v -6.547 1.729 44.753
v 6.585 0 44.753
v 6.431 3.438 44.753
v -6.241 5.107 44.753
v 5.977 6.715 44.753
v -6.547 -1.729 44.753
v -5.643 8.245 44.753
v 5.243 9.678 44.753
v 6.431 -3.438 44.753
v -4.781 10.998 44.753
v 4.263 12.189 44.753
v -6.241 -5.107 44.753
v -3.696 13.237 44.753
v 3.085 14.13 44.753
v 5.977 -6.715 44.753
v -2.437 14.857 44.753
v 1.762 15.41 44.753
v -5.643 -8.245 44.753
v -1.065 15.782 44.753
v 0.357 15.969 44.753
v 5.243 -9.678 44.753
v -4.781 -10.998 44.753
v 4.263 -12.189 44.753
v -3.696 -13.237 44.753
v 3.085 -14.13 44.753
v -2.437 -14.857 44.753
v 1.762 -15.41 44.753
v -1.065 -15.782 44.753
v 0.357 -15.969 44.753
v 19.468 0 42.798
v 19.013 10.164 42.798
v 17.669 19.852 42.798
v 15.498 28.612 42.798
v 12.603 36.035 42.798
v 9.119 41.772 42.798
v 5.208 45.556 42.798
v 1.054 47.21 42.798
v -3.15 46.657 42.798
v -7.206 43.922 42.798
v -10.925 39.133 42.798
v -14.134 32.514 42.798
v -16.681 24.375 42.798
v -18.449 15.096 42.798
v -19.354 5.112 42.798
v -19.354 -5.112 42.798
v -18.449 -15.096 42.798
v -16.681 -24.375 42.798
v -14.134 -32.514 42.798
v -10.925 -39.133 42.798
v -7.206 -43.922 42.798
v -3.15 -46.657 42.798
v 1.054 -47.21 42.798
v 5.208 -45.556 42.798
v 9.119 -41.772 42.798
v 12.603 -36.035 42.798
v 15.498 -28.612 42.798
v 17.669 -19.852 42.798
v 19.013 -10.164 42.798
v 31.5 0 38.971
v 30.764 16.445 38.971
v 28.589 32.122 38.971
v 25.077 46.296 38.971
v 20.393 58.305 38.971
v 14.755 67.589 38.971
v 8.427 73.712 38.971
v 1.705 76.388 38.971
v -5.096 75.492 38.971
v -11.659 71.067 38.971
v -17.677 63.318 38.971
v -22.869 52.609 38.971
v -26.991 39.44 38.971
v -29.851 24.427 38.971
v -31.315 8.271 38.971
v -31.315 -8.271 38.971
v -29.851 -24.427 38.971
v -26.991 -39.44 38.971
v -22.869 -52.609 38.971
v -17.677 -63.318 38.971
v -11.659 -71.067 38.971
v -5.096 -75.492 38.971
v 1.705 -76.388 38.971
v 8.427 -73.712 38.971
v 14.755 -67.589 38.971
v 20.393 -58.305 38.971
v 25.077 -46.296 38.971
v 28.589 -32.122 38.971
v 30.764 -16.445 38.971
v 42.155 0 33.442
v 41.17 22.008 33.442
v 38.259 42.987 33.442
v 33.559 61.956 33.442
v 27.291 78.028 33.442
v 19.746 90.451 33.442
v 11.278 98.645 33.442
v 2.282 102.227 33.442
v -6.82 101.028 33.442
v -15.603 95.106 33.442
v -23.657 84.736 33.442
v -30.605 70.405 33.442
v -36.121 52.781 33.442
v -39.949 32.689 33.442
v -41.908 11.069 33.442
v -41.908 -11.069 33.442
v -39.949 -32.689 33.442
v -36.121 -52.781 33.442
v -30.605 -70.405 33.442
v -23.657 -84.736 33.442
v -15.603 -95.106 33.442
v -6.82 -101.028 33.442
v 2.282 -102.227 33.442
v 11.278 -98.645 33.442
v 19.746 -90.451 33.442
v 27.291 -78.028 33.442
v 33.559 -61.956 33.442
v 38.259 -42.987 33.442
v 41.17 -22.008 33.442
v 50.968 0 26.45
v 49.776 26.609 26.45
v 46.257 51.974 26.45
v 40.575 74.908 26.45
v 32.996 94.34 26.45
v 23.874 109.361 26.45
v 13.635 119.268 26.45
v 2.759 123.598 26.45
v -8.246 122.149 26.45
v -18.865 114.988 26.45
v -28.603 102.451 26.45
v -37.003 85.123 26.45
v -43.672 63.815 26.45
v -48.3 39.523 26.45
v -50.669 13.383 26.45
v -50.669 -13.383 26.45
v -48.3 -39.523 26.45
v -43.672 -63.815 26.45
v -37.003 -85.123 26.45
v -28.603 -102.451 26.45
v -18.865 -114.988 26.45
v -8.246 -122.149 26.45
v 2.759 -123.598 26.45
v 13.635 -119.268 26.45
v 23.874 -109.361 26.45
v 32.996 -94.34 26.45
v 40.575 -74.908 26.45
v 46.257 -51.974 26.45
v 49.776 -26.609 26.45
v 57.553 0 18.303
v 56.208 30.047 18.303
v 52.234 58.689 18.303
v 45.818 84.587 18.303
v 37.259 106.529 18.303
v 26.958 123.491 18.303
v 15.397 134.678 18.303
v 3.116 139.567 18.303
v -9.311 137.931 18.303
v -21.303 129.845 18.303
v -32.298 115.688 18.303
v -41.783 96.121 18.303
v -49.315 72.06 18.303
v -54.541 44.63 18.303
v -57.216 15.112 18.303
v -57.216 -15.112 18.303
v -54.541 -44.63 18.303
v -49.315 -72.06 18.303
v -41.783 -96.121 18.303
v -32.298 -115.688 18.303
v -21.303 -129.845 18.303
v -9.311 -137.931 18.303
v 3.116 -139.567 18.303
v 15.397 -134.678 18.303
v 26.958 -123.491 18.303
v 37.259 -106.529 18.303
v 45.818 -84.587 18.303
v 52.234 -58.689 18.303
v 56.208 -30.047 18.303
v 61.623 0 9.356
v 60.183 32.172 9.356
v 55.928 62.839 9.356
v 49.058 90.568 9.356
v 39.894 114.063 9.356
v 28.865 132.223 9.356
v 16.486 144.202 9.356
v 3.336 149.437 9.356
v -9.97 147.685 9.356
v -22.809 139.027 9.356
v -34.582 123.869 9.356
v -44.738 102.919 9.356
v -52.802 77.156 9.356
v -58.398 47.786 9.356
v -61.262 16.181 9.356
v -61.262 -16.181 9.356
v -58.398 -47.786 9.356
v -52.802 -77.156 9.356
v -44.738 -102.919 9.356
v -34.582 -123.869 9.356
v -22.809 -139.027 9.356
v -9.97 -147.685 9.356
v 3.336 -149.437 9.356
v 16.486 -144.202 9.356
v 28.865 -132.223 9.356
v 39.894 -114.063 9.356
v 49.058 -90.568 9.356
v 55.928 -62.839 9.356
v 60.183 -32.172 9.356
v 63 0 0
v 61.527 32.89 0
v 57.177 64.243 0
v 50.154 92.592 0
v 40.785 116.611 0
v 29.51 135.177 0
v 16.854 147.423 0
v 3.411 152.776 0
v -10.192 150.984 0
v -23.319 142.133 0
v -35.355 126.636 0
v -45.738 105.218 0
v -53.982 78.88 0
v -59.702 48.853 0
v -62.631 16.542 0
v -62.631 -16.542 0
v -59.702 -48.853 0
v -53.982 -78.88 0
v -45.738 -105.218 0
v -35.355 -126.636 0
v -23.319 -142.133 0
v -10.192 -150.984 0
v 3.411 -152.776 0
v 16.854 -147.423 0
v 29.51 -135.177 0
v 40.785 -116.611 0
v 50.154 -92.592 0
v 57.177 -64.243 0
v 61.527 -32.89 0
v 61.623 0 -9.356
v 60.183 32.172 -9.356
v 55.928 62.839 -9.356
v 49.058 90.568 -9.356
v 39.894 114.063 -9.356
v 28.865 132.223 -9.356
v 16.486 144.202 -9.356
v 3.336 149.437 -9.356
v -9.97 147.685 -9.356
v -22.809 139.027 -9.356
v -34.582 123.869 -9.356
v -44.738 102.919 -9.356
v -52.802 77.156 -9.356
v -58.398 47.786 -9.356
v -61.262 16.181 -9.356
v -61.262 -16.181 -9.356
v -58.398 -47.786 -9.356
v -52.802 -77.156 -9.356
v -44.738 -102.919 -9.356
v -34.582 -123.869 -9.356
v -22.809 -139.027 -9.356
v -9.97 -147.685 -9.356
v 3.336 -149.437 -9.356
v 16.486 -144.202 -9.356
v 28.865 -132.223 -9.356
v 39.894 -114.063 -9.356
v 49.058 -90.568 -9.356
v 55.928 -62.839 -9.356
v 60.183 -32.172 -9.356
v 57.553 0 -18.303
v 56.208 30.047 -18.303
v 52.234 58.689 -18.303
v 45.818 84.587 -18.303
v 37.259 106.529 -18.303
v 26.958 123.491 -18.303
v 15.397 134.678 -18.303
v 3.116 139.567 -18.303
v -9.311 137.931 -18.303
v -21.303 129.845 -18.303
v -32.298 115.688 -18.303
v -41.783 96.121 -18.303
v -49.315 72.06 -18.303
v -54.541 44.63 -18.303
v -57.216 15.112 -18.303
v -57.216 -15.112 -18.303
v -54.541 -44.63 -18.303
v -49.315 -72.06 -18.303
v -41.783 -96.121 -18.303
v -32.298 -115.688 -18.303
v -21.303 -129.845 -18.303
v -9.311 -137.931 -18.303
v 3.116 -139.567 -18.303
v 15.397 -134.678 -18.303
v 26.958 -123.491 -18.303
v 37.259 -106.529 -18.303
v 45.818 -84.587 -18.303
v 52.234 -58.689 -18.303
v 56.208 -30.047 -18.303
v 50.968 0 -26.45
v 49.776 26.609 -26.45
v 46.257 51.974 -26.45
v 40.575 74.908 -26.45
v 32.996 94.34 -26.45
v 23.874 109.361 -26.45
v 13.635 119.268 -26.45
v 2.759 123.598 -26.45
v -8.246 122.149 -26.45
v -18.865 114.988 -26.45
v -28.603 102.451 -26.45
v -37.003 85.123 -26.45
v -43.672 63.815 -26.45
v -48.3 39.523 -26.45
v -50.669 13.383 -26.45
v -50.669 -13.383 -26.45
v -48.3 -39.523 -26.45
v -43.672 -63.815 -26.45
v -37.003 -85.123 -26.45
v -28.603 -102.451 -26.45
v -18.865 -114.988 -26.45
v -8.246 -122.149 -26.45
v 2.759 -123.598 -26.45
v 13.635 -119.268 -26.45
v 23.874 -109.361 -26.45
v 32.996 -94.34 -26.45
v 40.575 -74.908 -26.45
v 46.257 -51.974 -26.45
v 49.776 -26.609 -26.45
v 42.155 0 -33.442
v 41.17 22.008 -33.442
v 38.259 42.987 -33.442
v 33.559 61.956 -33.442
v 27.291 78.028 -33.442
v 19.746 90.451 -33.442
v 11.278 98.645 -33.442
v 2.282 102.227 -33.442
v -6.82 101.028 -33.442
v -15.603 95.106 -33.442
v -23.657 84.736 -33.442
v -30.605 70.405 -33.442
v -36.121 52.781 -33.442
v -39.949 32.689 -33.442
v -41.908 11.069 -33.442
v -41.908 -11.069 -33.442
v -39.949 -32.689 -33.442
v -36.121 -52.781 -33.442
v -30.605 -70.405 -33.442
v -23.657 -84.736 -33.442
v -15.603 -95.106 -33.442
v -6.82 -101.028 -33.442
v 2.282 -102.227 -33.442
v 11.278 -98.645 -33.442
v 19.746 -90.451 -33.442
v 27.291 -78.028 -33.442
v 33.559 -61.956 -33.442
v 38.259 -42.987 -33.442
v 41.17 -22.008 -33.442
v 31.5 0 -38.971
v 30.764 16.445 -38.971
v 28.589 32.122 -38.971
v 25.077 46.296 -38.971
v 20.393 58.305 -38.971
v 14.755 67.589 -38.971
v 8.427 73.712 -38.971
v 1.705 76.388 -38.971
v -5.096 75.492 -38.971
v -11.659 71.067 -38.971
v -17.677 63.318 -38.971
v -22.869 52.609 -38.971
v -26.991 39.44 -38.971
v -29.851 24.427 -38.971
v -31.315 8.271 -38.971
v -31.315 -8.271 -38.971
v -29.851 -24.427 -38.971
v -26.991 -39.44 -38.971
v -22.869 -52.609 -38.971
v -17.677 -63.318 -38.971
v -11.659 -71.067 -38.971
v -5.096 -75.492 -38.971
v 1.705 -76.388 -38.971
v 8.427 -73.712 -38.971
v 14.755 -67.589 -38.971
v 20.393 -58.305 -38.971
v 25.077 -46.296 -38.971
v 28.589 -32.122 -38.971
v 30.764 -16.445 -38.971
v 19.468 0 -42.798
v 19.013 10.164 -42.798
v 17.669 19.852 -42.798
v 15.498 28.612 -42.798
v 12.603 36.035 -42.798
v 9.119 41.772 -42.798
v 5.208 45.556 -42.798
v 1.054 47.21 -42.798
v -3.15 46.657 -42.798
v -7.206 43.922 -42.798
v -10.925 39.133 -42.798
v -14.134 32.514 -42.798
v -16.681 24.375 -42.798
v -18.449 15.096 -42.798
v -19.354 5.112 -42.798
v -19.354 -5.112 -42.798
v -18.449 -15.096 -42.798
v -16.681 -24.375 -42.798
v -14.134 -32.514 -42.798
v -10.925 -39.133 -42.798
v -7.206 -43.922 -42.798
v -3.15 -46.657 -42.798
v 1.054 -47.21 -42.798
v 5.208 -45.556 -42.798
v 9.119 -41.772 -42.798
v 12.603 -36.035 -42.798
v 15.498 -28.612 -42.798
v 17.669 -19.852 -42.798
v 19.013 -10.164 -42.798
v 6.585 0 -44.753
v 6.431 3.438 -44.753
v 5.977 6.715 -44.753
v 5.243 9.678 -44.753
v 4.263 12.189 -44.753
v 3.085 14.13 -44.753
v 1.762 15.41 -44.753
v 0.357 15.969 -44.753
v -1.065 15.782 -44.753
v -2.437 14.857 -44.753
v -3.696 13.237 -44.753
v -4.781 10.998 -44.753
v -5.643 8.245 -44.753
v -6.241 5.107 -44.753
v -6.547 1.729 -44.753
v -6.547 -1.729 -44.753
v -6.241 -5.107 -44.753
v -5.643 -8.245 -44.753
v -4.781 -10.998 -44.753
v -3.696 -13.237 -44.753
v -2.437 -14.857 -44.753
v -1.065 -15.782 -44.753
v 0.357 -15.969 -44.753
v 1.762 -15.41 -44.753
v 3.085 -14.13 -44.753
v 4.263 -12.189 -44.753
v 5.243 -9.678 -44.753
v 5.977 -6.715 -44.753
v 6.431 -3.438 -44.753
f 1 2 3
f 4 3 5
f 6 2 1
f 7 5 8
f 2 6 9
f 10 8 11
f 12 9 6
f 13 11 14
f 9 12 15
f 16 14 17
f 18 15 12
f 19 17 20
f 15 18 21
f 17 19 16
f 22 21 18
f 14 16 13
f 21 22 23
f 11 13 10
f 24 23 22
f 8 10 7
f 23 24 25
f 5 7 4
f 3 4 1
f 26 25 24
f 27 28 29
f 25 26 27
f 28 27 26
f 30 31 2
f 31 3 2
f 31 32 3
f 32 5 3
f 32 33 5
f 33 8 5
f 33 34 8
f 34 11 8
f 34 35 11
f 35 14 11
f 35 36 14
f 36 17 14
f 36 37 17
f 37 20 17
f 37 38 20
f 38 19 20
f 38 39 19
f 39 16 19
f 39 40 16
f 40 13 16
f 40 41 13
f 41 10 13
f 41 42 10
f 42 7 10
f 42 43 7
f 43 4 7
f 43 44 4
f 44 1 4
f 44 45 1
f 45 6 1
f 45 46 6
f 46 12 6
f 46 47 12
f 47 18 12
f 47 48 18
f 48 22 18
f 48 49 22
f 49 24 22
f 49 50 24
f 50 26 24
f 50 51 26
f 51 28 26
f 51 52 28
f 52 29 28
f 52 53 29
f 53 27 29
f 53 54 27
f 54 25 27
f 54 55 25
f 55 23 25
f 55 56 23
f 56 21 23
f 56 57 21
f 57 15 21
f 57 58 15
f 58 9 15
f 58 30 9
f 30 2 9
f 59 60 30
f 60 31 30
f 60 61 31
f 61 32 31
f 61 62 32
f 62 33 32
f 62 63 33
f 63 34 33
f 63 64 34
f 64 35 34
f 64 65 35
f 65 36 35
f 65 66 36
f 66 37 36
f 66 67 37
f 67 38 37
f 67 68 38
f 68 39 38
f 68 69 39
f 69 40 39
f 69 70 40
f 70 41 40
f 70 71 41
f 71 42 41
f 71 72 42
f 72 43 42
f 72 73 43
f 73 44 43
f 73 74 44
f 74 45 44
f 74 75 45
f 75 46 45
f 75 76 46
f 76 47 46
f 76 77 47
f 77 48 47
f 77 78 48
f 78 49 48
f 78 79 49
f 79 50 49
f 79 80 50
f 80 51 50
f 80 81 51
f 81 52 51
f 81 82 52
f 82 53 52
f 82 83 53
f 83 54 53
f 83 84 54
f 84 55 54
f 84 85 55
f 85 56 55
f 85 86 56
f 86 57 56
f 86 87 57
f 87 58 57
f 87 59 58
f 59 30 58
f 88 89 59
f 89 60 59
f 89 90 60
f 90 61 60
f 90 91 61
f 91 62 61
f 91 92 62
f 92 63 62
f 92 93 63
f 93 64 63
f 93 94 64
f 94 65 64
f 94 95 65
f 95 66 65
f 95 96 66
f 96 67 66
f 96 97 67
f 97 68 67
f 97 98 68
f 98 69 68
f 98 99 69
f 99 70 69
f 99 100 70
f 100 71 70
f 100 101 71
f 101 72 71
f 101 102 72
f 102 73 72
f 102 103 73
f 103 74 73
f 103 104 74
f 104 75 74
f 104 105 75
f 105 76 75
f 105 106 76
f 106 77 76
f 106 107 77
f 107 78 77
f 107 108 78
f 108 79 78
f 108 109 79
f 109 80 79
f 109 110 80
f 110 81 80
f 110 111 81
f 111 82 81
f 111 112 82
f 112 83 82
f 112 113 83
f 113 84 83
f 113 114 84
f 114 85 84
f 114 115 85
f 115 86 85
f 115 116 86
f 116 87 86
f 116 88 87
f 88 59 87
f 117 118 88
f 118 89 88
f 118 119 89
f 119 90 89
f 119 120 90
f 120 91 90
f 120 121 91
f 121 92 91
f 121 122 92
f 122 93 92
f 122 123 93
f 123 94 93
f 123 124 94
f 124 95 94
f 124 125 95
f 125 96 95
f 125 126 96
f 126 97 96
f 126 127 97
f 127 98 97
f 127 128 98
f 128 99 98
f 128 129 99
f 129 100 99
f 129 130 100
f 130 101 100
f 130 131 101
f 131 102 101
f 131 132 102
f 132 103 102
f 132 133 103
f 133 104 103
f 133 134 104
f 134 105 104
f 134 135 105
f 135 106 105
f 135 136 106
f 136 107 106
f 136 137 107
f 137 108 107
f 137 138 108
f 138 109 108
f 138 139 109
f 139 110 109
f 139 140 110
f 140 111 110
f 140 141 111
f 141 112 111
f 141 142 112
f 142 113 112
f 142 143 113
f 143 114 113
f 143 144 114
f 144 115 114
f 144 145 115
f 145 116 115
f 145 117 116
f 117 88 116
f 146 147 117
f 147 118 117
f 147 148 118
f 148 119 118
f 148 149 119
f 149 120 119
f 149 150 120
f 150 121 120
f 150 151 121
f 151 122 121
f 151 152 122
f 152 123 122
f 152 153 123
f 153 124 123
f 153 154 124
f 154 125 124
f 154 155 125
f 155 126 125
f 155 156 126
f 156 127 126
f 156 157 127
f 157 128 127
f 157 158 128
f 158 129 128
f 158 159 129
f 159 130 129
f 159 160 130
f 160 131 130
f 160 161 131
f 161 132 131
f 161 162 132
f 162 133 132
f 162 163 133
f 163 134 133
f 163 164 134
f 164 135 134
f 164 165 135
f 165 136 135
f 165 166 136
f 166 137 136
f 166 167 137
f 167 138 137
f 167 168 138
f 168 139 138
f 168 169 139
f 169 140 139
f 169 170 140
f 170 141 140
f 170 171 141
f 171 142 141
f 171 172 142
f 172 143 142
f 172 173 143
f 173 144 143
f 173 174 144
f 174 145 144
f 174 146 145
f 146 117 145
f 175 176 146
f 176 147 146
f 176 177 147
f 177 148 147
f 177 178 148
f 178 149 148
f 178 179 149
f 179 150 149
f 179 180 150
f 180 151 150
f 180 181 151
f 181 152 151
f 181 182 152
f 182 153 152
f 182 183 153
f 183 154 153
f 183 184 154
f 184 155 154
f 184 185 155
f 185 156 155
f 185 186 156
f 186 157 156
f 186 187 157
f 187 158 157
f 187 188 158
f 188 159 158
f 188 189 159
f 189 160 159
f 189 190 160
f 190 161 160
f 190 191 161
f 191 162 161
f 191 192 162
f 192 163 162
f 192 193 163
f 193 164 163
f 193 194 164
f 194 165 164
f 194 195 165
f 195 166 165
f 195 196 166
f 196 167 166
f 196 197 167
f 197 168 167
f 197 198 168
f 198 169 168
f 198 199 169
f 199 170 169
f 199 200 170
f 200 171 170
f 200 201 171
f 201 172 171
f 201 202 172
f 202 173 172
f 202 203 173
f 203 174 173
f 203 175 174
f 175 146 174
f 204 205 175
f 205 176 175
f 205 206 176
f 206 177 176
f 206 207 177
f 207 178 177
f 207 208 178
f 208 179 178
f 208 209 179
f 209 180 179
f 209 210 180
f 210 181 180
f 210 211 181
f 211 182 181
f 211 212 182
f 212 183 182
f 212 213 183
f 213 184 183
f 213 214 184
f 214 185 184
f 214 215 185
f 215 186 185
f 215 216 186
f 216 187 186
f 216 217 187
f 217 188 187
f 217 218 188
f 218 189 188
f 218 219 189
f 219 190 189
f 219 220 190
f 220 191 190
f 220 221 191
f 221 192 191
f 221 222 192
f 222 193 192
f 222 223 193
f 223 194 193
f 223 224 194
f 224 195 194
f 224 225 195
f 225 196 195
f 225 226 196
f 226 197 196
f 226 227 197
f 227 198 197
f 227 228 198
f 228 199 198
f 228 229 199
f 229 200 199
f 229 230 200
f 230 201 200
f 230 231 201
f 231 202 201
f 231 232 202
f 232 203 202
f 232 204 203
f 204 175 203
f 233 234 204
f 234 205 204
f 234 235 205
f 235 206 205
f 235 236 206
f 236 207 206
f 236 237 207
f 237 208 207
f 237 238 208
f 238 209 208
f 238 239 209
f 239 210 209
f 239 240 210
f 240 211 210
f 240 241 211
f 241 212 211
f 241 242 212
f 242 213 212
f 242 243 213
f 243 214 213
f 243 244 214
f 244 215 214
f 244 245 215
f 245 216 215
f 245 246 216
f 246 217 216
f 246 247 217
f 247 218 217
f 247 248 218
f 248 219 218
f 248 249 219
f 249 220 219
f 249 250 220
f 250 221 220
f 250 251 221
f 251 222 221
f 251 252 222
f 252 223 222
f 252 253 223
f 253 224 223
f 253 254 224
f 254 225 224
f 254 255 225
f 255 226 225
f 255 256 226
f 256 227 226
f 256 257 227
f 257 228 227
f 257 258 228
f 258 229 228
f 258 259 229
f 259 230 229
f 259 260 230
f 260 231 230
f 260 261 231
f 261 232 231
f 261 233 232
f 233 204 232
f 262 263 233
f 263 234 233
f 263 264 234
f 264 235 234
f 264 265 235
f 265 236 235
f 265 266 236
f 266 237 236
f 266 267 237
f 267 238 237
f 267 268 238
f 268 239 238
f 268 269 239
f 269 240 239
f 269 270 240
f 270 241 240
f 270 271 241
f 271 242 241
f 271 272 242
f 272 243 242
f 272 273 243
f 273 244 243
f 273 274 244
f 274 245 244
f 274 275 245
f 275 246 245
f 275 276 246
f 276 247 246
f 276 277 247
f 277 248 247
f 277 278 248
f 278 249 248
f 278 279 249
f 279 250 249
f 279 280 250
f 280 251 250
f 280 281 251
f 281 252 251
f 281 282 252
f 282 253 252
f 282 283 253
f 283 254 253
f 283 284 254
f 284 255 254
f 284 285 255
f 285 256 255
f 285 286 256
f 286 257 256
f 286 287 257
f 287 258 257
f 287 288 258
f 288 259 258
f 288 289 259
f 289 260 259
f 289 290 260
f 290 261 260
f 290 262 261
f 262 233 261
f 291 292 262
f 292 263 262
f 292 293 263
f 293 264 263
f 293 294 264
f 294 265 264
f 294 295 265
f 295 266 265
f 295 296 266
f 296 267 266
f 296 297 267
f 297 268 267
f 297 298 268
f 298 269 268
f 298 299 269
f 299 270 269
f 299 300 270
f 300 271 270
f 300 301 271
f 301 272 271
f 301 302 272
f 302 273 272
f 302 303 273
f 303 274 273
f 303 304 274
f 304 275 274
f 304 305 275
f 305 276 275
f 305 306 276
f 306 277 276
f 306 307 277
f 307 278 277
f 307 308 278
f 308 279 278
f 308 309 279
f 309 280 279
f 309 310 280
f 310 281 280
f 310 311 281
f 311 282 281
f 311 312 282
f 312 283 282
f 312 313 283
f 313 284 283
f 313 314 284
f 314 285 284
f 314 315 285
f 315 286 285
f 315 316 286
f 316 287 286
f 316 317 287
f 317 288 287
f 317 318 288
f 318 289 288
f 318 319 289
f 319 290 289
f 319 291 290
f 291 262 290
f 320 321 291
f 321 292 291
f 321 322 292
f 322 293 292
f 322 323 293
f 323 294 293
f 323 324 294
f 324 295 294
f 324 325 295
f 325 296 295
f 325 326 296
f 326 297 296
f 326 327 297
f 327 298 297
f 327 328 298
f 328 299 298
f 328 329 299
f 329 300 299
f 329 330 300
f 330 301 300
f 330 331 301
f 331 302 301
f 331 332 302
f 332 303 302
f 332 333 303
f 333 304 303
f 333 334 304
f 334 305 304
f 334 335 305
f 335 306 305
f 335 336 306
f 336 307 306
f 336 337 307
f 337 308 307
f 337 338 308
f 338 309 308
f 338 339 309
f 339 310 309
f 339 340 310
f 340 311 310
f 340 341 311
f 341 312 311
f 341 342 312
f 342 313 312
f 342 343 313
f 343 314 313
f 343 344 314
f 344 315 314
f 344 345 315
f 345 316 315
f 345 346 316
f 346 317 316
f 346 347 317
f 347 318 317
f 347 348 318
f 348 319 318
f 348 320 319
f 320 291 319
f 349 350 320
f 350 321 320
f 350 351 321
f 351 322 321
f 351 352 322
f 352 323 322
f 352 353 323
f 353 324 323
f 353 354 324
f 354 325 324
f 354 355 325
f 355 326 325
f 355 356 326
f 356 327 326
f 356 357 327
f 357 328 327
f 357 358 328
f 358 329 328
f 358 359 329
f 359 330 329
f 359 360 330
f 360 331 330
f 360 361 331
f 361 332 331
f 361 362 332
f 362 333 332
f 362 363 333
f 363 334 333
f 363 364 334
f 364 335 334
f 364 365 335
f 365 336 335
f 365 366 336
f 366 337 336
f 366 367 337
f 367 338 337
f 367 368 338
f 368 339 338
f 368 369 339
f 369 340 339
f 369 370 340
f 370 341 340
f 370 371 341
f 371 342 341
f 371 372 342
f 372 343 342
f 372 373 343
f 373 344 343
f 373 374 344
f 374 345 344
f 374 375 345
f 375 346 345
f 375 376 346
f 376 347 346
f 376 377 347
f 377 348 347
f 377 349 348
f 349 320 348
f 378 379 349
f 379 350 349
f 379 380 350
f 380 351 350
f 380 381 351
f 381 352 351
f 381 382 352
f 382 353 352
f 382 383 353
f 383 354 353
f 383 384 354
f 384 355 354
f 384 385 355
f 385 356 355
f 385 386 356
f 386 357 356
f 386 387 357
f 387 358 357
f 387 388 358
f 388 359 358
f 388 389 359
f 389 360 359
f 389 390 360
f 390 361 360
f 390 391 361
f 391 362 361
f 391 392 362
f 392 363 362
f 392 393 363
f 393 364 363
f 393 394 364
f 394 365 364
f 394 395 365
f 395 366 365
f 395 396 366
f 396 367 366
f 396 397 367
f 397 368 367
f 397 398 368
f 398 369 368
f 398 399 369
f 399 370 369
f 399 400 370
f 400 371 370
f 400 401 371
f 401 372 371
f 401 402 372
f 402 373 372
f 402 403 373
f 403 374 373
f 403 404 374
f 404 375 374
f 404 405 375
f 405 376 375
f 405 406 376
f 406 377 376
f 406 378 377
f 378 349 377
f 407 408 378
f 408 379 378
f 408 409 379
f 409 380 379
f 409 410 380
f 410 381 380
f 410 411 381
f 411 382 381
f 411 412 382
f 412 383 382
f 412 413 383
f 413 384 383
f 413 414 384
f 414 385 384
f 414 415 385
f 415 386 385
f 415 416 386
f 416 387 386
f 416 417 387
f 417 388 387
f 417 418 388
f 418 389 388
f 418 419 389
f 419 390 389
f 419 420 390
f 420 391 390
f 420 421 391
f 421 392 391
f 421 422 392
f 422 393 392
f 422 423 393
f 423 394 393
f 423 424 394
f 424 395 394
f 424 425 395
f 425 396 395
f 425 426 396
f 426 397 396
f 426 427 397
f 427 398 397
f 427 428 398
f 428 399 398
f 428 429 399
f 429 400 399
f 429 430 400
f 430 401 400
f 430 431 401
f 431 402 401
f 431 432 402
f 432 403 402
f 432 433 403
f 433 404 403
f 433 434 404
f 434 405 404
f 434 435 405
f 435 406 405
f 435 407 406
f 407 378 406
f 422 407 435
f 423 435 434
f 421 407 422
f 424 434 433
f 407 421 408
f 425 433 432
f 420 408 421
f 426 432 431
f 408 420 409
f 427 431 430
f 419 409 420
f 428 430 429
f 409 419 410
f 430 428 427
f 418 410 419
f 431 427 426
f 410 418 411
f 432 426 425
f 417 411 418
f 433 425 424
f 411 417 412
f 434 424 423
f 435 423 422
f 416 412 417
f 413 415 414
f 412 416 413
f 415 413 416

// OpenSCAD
// Generated by SolidPython 1.0.1 on 2020-07-29 00:46:48


scale(v = [7, 17, 5]) {
	sphere(r = 9);
}
/***********************************************
*********      SolidPython code:      **********
************************************************
 
# import packages: SolidPython
from solid import *
from solid.utils import *
from itertools import chain, combinations, permutations


class Resize:

    def __init__(self, scad_file):
        self.scad_file = scad_file
        #self.scad_file = import_scad(scad_file)
        # cone/cylinder param:
        self.r1 = 0
        self.r2 = 0
        self.h = 0
        # rectangular prism param:
        self.w = 0
        self.l = 0
        # ellipse param:
        self.r = 0

    # import OpenScad code (file name corresponds to shape)


    # classify shape + parameters
    def assign(self, param1, param2, param3):
        if self.scad_file == 'cone.scad':
            self.r1 = param1
            self.r2 = param2
            self.h = param3
        elif self.scad_file == 'cylinder.scad':
            self.r1 = param1
            self.r2 = param2
            self.h = param3
        elif self.scad_file == 'rectangularPrism.scad':
            self.h = param1
            self.l = param2
            self.w = param3
        else:
            self.r = param1
            self.h = param2

    # resize parameters
    def iterate(self):
        x = range(3, 20, 2)
        i = 1
        if self.scad_file == 'cone.scad':
            tempList = list(permutations(x, 2))
            for temp in tempList:
                param1 = temp[0]
                param2 = temp[1]
                filepath = 'produced_scad_files/' + 'cone' + str(param1) + '_' + str(param2) + '_' + '.scad'
                scad_render_to_file(cylinder(h=param1, r1=param2, r2=0), filepath)

        elif self.scad_file == 'cylinder.scad':
            tempList = list(permutations(x, 3))
            for temp in tempList:
                param1 = temp[0]
                param2 = temp[1]
                filepath = 'produced_scad_files/' + 'cylinder' + str(param1) + '_' + str(param2) + '_' + '.scad'
                scad_render_to_file(cylinder(h=param1, r1=param2, r2=param2), filepath)

        elif self.scad_file == 'rectangularPrism.scad':
            tempList = list(permutations(x, 3))
            for temp in tempList:
                param1 = temp[0]
                param2 = temp[1]
                param3 = temp[2]
                filepath = 'produced_scad_files/' + 'rectangularPrism' + str(param1) + '_' + str(param2) + '_' + str(
                    param3) + '.scad'
                scad_render_to_file(cube(size=(param1, param2, param3)), filepath)

        elif self.scad_file == 'ellipse.scad':
            tempList = list(permutations(x, 4))
            for temp in tempList:
                param1 = temp[0]
                param2 = temp[1]
                param3 = temp[2]
                param4 = temp[3]
                filepath = 'produced_scad_files/' + 'ellipse' + str(param1) + '_' + str(param2) + '_' + str(param3) + '_' + str(param4) + '.scad'
                scad_render_to_file(scale([param1, param2, param3])(sphere(r=param4)), filepath)

    def render_to_scadfile(self):
        scad_render_to_file(scad, 'example.scad') 
 
************************************************/
